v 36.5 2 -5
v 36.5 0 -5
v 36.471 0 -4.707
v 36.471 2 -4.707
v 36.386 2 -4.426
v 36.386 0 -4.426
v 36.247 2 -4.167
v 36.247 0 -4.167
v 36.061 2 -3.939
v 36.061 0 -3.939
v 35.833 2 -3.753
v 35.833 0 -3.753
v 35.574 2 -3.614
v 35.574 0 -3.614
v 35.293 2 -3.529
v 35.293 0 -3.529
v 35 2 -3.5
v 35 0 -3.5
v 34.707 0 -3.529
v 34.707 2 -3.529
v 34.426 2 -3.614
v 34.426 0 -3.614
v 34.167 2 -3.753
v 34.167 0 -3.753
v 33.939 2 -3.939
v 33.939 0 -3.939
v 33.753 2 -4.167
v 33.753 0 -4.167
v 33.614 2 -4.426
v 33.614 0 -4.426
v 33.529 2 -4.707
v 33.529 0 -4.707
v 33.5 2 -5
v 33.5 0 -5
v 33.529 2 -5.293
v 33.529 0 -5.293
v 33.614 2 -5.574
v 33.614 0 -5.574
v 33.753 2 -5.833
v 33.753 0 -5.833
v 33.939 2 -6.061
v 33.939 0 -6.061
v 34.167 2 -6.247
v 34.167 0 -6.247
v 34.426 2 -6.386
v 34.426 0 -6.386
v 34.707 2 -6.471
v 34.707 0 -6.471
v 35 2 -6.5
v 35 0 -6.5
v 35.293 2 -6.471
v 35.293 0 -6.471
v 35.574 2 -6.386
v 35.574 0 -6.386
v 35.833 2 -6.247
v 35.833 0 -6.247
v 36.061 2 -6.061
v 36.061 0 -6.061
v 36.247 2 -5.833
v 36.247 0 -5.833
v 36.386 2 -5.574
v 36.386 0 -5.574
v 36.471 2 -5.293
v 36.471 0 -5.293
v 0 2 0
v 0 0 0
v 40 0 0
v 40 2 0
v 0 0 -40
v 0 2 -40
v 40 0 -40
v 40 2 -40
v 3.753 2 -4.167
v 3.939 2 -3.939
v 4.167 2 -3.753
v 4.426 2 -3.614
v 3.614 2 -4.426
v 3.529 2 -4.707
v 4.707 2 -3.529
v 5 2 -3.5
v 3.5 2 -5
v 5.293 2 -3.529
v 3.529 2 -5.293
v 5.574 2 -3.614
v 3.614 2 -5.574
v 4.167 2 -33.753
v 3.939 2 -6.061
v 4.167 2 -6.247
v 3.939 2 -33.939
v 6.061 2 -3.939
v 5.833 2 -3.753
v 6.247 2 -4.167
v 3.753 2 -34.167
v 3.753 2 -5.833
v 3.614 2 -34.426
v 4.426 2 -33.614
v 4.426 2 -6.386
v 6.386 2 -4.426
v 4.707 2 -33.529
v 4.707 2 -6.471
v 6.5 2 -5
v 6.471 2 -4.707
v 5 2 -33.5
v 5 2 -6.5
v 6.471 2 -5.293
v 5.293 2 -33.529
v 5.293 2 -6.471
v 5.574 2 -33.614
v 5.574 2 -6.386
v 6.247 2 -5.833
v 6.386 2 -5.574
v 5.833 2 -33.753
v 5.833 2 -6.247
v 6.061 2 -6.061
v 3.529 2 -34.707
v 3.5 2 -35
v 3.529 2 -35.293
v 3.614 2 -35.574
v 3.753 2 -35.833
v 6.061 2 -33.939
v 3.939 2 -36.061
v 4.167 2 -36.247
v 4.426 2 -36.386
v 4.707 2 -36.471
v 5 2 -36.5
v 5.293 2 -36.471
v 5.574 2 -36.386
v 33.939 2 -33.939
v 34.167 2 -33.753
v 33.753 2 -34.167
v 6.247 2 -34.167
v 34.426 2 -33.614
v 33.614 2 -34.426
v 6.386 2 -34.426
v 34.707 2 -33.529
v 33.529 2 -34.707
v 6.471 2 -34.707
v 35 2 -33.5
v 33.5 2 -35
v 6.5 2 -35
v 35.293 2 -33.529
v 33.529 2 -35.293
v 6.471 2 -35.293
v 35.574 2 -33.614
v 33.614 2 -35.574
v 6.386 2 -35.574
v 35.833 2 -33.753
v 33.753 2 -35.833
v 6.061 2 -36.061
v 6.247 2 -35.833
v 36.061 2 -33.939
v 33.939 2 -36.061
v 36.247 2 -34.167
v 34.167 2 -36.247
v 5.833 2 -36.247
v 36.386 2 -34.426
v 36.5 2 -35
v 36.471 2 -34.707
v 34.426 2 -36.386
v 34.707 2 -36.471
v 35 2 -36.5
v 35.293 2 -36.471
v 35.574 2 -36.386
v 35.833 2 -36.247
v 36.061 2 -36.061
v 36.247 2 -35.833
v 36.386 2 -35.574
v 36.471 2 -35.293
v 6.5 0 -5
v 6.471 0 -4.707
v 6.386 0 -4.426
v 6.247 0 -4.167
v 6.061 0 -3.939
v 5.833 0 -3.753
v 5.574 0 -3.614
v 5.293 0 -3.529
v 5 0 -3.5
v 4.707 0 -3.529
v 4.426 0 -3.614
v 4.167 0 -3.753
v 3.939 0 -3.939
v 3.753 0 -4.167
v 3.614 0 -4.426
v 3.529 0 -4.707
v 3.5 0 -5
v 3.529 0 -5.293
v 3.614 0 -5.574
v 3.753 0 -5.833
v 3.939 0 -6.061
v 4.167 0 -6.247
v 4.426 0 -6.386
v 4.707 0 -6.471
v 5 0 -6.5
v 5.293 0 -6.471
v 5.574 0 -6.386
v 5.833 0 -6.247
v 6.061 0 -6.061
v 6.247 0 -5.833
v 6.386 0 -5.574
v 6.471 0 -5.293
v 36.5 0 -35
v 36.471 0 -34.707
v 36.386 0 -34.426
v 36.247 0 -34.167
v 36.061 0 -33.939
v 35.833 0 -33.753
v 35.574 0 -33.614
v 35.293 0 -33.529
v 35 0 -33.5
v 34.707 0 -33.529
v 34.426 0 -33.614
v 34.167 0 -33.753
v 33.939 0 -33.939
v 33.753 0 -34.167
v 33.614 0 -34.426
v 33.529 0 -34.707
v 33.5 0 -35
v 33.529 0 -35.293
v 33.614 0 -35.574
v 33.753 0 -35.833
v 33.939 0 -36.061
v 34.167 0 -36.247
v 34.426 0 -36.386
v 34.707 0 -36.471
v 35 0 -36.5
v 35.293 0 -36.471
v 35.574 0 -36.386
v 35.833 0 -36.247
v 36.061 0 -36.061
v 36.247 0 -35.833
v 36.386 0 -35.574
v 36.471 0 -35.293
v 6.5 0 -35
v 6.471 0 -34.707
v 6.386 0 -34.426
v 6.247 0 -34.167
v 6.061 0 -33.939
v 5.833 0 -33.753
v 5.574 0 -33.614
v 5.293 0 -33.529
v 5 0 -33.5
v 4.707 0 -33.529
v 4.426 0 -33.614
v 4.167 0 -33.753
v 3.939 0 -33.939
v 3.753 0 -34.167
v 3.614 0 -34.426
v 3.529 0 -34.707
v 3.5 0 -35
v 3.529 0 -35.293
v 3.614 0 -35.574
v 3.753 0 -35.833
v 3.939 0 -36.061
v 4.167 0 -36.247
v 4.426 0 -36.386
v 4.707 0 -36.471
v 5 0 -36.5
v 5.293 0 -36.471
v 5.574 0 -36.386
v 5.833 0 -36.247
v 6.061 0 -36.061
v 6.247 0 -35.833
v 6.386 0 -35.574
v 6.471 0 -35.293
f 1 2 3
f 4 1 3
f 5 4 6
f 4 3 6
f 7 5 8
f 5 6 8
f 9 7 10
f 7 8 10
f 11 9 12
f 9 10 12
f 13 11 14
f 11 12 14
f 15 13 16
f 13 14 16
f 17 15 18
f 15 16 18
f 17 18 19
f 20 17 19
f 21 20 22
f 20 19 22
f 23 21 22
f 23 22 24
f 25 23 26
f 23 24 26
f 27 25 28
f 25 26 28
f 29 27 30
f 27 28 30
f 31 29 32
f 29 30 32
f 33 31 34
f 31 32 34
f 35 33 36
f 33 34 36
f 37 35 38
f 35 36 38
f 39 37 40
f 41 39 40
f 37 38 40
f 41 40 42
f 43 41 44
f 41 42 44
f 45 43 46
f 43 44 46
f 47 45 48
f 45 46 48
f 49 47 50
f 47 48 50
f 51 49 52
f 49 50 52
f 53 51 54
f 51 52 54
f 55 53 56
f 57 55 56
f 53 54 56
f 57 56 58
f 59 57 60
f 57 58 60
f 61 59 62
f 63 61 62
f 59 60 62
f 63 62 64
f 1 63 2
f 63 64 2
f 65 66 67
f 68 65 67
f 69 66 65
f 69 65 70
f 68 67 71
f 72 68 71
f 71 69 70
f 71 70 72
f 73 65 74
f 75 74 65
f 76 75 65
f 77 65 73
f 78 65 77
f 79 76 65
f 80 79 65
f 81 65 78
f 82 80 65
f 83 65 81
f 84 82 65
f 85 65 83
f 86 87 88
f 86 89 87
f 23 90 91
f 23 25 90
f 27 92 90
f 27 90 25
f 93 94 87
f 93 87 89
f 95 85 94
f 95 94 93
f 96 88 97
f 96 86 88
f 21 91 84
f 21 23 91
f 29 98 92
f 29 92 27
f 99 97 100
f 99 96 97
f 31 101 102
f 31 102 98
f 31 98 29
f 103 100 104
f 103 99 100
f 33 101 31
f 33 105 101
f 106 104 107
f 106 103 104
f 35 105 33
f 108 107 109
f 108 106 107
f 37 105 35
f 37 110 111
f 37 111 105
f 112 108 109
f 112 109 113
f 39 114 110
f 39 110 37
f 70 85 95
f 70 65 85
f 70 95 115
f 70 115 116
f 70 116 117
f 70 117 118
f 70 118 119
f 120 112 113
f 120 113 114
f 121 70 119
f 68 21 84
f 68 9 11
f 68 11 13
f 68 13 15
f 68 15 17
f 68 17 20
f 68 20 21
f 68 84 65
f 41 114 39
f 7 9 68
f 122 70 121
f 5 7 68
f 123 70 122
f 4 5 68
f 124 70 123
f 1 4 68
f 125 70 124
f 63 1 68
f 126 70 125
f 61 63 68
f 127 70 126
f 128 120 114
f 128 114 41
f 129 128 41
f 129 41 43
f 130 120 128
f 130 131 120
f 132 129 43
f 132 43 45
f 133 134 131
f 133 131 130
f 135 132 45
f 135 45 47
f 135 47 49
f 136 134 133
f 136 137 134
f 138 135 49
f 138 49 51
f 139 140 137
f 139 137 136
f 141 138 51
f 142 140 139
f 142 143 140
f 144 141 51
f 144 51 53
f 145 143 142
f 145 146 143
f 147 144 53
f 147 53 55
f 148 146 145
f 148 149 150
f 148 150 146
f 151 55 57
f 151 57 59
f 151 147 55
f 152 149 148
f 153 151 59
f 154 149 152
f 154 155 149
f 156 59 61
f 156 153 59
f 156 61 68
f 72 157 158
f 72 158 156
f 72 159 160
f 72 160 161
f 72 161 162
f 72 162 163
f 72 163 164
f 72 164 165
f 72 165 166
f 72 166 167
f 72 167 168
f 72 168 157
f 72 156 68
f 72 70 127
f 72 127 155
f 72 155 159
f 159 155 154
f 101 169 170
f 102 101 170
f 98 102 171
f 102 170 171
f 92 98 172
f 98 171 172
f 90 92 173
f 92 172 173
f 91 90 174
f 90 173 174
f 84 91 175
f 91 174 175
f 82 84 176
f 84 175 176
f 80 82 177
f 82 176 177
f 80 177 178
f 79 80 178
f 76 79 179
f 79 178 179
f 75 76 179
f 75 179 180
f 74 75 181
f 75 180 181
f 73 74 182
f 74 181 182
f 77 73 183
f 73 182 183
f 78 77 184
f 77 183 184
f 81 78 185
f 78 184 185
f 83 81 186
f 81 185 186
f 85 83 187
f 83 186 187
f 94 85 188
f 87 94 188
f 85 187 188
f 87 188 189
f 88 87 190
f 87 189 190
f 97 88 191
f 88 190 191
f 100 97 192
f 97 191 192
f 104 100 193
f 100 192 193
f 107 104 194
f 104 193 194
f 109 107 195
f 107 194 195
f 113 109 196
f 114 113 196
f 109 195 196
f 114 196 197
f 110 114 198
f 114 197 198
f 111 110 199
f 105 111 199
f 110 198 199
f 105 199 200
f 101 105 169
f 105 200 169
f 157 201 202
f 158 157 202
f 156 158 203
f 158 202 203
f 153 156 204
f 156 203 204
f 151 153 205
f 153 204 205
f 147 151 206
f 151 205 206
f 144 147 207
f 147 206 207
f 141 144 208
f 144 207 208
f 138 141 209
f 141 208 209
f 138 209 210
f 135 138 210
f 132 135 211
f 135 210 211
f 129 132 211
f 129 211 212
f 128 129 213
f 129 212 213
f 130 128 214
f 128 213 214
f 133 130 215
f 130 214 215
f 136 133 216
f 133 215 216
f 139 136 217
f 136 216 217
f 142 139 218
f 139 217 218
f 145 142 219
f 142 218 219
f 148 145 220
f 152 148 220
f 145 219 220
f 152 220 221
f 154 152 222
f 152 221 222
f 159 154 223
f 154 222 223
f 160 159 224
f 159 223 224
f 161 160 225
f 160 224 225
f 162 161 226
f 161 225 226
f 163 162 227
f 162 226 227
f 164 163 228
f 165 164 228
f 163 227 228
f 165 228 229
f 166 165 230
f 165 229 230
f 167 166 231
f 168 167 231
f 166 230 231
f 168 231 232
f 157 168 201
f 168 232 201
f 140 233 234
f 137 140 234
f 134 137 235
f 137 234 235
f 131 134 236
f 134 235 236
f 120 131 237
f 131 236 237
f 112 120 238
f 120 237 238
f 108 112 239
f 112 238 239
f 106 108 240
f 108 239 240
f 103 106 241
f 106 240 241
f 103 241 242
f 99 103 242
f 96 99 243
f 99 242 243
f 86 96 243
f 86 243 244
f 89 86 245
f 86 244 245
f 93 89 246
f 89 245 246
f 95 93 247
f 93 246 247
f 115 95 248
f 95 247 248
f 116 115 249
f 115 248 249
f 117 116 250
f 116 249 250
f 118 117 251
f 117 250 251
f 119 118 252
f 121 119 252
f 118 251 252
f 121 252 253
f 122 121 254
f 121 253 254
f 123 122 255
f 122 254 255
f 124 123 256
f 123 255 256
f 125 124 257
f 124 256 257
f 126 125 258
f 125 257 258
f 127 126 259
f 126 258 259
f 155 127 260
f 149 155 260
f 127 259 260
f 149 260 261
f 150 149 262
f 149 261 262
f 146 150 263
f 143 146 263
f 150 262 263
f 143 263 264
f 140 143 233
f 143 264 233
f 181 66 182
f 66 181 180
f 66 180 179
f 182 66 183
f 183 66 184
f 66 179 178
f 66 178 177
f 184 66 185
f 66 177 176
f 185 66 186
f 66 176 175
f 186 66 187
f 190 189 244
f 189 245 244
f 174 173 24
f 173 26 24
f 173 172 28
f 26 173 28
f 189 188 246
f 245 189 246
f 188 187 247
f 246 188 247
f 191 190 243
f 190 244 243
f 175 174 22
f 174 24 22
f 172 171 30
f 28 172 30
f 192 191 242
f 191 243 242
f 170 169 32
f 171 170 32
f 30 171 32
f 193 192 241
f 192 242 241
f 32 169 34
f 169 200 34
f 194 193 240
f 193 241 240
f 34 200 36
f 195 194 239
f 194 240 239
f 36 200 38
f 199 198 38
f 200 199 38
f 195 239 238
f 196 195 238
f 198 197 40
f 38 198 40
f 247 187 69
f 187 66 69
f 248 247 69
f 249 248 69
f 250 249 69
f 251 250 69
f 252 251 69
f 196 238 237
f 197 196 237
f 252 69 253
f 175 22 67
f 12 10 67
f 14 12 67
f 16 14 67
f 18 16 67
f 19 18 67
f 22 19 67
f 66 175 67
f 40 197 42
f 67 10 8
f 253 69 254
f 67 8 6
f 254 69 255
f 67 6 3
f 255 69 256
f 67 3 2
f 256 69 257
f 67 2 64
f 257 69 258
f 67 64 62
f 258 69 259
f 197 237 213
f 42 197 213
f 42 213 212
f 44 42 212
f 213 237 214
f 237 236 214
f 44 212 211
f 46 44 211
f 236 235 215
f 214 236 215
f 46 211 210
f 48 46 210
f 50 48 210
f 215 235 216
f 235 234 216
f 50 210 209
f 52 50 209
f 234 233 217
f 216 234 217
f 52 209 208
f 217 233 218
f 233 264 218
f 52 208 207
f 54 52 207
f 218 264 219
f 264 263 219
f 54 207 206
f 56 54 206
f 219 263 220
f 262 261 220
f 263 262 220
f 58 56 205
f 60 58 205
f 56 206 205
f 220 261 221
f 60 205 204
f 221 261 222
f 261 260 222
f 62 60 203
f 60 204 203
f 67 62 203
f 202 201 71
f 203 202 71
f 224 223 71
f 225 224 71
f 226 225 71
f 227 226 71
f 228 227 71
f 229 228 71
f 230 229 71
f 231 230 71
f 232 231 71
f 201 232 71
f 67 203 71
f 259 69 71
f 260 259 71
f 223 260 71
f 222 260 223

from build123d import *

# Parameters (mm, degrees)
SKETCH1_W           = 40
SKETCH1_H           = 40
BOSS_EXTRUDE1_DEPTH = 2
SKETCH2_R           = 1.5
CUT_EXTRUDE1_DEPTH  = 2


with BuildPart() as part:
    # Sketch1 → Boss-Extrude1 (new body)
    with BuildSketch(Plane(origin=(0, 0, 0), x_dir=(1, 0, 0), z_dir=(0, 1, 0))):
        with Locations((20, 20)):
            Rectangle(SKETCH1_W, SKETCH1_H)
    extrude(amount=BOSS_EXTRUDE1_DEPTH)

    # Sketch2 → Cut-Extrude1 (cut)
    with BuildSketch(Plane.XZ):
        with Locations((35, -5)):
            Circle(SKETCH2_R)
        with Locations((35, -35)):
            Circle(SKETCH2_R)
        with Locations((5, -5)):
            Circle(SKETCH2_R)
        with Locations((5, -35)):
            Circle(SKETCH2_R)
    extrude(amount=-CUT_EXTRUDE1_DEPTH, mode=Mode.SUBTRACT)


solid = part.part
